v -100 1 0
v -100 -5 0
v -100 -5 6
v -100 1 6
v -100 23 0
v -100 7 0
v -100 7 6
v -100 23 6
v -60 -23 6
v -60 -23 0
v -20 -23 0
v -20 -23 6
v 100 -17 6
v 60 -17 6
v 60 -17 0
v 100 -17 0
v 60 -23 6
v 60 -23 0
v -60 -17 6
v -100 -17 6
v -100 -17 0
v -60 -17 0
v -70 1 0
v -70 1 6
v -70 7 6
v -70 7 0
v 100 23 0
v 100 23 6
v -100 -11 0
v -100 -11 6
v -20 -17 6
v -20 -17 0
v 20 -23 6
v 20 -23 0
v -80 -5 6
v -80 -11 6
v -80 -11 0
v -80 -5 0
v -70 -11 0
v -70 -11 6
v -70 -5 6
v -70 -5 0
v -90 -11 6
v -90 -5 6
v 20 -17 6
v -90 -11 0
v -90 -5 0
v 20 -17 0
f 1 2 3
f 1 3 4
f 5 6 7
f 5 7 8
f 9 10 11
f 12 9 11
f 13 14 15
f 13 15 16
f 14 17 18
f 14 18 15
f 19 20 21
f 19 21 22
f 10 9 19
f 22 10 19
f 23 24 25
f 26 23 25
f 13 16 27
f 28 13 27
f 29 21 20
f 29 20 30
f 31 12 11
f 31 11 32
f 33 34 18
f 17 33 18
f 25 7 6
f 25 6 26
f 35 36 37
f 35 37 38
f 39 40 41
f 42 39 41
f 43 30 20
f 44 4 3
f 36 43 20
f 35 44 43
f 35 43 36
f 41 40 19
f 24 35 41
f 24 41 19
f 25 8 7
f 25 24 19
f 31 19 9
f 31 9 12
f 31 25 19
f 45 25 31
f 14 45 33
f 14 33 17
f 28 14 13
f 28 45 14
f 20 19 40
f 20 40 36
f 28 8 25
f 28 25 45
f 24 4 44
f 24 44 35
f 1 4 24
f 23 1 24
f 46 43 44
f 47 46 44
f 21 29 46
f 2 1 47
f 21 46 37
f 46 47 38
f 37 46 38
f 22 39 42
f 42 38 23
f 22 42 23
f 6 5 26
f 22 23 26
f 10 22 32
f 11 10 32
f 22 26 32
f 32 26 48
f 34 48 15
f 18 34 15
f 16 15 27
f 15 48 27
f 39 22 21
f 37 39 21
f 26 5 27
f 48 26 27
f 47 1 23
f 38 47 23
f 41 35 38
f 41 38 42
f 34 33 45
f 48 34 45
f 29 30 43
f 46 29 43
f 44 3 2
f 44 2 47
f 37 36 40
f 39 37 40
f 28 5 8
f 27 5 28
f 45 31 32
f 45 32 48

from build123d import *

# Parameters (mm, degrees)
SKETCH1_W           = 200
SKETCH1_H           = 46
BOSS_EXTRUDE1_DEPTH = 6
SKETCH2_W           = 40
SKETCH2_H           = 6
CUT_EXTRUDE1_DEPTH  = 6
SKETCH3_W           = 10
SKETCH3_H           = 6
CUT_EXTRUDE2_DEPTH  = 10
SKETCH4_W           = 30
SKETCH4_H           = 6
CUT_EXTRUDE3_DEPTH  = 10


with BuildPart() as part:
    # Sketch1 → Boss-Extrude1 (new body)
    with BuildSketch(Plane.XY):
        Rectangle(SKETCH1_W, SKETCH1_H)
    extrude(amount=BOSS_EXTRUDE1_DEPTH)

    # Sketch2 → Cut-Extrude1 (cut)
    with BuildSketch(Plane.XY.offset(6)):
        with Locations((0, -20)):
            Rectangle(SKETCH2_W, SKETCH2_H)
        with Locations((-80, -20)):
            Rectangle(SKETCH2_W, SKETCH2_H)
        with Locations((80, -20)):
            Rectangle(SKETCH2_W, SKETCH2_H)
    extrude(amount=-CUT_EXTRUDE1_DEPTH, mode=Mode.SUBTRACT)

    # Sketch3 → Cut-Extrude2 (cut)
    with BuildSketch(Plane.XY.offset(6)):
        with Locations((-95, -8)):
            Rectangle(SKETCH3_W, SKETCH3_H)
        with Locations((-75, -8)):
            Rectangle(SKETCH3_W, SKETCH3_H)
    extrude(amount=-CUT_EXTRUDE2_DEPTH, mode=Mode.SUBTRACT)

    # Sketch4 → Cut-Extrude3 (cut)
    with BuildSketch(Plane.XY.offset(6)):
        with Locations((-85, 4)):
            Rectangle(SKETCH4_W, SKETCH4_H)
    extrude(amount=-CUT_EXTRUDE3_DEPTH, mode=Mode.SUBTRACT)


solid = part.part
